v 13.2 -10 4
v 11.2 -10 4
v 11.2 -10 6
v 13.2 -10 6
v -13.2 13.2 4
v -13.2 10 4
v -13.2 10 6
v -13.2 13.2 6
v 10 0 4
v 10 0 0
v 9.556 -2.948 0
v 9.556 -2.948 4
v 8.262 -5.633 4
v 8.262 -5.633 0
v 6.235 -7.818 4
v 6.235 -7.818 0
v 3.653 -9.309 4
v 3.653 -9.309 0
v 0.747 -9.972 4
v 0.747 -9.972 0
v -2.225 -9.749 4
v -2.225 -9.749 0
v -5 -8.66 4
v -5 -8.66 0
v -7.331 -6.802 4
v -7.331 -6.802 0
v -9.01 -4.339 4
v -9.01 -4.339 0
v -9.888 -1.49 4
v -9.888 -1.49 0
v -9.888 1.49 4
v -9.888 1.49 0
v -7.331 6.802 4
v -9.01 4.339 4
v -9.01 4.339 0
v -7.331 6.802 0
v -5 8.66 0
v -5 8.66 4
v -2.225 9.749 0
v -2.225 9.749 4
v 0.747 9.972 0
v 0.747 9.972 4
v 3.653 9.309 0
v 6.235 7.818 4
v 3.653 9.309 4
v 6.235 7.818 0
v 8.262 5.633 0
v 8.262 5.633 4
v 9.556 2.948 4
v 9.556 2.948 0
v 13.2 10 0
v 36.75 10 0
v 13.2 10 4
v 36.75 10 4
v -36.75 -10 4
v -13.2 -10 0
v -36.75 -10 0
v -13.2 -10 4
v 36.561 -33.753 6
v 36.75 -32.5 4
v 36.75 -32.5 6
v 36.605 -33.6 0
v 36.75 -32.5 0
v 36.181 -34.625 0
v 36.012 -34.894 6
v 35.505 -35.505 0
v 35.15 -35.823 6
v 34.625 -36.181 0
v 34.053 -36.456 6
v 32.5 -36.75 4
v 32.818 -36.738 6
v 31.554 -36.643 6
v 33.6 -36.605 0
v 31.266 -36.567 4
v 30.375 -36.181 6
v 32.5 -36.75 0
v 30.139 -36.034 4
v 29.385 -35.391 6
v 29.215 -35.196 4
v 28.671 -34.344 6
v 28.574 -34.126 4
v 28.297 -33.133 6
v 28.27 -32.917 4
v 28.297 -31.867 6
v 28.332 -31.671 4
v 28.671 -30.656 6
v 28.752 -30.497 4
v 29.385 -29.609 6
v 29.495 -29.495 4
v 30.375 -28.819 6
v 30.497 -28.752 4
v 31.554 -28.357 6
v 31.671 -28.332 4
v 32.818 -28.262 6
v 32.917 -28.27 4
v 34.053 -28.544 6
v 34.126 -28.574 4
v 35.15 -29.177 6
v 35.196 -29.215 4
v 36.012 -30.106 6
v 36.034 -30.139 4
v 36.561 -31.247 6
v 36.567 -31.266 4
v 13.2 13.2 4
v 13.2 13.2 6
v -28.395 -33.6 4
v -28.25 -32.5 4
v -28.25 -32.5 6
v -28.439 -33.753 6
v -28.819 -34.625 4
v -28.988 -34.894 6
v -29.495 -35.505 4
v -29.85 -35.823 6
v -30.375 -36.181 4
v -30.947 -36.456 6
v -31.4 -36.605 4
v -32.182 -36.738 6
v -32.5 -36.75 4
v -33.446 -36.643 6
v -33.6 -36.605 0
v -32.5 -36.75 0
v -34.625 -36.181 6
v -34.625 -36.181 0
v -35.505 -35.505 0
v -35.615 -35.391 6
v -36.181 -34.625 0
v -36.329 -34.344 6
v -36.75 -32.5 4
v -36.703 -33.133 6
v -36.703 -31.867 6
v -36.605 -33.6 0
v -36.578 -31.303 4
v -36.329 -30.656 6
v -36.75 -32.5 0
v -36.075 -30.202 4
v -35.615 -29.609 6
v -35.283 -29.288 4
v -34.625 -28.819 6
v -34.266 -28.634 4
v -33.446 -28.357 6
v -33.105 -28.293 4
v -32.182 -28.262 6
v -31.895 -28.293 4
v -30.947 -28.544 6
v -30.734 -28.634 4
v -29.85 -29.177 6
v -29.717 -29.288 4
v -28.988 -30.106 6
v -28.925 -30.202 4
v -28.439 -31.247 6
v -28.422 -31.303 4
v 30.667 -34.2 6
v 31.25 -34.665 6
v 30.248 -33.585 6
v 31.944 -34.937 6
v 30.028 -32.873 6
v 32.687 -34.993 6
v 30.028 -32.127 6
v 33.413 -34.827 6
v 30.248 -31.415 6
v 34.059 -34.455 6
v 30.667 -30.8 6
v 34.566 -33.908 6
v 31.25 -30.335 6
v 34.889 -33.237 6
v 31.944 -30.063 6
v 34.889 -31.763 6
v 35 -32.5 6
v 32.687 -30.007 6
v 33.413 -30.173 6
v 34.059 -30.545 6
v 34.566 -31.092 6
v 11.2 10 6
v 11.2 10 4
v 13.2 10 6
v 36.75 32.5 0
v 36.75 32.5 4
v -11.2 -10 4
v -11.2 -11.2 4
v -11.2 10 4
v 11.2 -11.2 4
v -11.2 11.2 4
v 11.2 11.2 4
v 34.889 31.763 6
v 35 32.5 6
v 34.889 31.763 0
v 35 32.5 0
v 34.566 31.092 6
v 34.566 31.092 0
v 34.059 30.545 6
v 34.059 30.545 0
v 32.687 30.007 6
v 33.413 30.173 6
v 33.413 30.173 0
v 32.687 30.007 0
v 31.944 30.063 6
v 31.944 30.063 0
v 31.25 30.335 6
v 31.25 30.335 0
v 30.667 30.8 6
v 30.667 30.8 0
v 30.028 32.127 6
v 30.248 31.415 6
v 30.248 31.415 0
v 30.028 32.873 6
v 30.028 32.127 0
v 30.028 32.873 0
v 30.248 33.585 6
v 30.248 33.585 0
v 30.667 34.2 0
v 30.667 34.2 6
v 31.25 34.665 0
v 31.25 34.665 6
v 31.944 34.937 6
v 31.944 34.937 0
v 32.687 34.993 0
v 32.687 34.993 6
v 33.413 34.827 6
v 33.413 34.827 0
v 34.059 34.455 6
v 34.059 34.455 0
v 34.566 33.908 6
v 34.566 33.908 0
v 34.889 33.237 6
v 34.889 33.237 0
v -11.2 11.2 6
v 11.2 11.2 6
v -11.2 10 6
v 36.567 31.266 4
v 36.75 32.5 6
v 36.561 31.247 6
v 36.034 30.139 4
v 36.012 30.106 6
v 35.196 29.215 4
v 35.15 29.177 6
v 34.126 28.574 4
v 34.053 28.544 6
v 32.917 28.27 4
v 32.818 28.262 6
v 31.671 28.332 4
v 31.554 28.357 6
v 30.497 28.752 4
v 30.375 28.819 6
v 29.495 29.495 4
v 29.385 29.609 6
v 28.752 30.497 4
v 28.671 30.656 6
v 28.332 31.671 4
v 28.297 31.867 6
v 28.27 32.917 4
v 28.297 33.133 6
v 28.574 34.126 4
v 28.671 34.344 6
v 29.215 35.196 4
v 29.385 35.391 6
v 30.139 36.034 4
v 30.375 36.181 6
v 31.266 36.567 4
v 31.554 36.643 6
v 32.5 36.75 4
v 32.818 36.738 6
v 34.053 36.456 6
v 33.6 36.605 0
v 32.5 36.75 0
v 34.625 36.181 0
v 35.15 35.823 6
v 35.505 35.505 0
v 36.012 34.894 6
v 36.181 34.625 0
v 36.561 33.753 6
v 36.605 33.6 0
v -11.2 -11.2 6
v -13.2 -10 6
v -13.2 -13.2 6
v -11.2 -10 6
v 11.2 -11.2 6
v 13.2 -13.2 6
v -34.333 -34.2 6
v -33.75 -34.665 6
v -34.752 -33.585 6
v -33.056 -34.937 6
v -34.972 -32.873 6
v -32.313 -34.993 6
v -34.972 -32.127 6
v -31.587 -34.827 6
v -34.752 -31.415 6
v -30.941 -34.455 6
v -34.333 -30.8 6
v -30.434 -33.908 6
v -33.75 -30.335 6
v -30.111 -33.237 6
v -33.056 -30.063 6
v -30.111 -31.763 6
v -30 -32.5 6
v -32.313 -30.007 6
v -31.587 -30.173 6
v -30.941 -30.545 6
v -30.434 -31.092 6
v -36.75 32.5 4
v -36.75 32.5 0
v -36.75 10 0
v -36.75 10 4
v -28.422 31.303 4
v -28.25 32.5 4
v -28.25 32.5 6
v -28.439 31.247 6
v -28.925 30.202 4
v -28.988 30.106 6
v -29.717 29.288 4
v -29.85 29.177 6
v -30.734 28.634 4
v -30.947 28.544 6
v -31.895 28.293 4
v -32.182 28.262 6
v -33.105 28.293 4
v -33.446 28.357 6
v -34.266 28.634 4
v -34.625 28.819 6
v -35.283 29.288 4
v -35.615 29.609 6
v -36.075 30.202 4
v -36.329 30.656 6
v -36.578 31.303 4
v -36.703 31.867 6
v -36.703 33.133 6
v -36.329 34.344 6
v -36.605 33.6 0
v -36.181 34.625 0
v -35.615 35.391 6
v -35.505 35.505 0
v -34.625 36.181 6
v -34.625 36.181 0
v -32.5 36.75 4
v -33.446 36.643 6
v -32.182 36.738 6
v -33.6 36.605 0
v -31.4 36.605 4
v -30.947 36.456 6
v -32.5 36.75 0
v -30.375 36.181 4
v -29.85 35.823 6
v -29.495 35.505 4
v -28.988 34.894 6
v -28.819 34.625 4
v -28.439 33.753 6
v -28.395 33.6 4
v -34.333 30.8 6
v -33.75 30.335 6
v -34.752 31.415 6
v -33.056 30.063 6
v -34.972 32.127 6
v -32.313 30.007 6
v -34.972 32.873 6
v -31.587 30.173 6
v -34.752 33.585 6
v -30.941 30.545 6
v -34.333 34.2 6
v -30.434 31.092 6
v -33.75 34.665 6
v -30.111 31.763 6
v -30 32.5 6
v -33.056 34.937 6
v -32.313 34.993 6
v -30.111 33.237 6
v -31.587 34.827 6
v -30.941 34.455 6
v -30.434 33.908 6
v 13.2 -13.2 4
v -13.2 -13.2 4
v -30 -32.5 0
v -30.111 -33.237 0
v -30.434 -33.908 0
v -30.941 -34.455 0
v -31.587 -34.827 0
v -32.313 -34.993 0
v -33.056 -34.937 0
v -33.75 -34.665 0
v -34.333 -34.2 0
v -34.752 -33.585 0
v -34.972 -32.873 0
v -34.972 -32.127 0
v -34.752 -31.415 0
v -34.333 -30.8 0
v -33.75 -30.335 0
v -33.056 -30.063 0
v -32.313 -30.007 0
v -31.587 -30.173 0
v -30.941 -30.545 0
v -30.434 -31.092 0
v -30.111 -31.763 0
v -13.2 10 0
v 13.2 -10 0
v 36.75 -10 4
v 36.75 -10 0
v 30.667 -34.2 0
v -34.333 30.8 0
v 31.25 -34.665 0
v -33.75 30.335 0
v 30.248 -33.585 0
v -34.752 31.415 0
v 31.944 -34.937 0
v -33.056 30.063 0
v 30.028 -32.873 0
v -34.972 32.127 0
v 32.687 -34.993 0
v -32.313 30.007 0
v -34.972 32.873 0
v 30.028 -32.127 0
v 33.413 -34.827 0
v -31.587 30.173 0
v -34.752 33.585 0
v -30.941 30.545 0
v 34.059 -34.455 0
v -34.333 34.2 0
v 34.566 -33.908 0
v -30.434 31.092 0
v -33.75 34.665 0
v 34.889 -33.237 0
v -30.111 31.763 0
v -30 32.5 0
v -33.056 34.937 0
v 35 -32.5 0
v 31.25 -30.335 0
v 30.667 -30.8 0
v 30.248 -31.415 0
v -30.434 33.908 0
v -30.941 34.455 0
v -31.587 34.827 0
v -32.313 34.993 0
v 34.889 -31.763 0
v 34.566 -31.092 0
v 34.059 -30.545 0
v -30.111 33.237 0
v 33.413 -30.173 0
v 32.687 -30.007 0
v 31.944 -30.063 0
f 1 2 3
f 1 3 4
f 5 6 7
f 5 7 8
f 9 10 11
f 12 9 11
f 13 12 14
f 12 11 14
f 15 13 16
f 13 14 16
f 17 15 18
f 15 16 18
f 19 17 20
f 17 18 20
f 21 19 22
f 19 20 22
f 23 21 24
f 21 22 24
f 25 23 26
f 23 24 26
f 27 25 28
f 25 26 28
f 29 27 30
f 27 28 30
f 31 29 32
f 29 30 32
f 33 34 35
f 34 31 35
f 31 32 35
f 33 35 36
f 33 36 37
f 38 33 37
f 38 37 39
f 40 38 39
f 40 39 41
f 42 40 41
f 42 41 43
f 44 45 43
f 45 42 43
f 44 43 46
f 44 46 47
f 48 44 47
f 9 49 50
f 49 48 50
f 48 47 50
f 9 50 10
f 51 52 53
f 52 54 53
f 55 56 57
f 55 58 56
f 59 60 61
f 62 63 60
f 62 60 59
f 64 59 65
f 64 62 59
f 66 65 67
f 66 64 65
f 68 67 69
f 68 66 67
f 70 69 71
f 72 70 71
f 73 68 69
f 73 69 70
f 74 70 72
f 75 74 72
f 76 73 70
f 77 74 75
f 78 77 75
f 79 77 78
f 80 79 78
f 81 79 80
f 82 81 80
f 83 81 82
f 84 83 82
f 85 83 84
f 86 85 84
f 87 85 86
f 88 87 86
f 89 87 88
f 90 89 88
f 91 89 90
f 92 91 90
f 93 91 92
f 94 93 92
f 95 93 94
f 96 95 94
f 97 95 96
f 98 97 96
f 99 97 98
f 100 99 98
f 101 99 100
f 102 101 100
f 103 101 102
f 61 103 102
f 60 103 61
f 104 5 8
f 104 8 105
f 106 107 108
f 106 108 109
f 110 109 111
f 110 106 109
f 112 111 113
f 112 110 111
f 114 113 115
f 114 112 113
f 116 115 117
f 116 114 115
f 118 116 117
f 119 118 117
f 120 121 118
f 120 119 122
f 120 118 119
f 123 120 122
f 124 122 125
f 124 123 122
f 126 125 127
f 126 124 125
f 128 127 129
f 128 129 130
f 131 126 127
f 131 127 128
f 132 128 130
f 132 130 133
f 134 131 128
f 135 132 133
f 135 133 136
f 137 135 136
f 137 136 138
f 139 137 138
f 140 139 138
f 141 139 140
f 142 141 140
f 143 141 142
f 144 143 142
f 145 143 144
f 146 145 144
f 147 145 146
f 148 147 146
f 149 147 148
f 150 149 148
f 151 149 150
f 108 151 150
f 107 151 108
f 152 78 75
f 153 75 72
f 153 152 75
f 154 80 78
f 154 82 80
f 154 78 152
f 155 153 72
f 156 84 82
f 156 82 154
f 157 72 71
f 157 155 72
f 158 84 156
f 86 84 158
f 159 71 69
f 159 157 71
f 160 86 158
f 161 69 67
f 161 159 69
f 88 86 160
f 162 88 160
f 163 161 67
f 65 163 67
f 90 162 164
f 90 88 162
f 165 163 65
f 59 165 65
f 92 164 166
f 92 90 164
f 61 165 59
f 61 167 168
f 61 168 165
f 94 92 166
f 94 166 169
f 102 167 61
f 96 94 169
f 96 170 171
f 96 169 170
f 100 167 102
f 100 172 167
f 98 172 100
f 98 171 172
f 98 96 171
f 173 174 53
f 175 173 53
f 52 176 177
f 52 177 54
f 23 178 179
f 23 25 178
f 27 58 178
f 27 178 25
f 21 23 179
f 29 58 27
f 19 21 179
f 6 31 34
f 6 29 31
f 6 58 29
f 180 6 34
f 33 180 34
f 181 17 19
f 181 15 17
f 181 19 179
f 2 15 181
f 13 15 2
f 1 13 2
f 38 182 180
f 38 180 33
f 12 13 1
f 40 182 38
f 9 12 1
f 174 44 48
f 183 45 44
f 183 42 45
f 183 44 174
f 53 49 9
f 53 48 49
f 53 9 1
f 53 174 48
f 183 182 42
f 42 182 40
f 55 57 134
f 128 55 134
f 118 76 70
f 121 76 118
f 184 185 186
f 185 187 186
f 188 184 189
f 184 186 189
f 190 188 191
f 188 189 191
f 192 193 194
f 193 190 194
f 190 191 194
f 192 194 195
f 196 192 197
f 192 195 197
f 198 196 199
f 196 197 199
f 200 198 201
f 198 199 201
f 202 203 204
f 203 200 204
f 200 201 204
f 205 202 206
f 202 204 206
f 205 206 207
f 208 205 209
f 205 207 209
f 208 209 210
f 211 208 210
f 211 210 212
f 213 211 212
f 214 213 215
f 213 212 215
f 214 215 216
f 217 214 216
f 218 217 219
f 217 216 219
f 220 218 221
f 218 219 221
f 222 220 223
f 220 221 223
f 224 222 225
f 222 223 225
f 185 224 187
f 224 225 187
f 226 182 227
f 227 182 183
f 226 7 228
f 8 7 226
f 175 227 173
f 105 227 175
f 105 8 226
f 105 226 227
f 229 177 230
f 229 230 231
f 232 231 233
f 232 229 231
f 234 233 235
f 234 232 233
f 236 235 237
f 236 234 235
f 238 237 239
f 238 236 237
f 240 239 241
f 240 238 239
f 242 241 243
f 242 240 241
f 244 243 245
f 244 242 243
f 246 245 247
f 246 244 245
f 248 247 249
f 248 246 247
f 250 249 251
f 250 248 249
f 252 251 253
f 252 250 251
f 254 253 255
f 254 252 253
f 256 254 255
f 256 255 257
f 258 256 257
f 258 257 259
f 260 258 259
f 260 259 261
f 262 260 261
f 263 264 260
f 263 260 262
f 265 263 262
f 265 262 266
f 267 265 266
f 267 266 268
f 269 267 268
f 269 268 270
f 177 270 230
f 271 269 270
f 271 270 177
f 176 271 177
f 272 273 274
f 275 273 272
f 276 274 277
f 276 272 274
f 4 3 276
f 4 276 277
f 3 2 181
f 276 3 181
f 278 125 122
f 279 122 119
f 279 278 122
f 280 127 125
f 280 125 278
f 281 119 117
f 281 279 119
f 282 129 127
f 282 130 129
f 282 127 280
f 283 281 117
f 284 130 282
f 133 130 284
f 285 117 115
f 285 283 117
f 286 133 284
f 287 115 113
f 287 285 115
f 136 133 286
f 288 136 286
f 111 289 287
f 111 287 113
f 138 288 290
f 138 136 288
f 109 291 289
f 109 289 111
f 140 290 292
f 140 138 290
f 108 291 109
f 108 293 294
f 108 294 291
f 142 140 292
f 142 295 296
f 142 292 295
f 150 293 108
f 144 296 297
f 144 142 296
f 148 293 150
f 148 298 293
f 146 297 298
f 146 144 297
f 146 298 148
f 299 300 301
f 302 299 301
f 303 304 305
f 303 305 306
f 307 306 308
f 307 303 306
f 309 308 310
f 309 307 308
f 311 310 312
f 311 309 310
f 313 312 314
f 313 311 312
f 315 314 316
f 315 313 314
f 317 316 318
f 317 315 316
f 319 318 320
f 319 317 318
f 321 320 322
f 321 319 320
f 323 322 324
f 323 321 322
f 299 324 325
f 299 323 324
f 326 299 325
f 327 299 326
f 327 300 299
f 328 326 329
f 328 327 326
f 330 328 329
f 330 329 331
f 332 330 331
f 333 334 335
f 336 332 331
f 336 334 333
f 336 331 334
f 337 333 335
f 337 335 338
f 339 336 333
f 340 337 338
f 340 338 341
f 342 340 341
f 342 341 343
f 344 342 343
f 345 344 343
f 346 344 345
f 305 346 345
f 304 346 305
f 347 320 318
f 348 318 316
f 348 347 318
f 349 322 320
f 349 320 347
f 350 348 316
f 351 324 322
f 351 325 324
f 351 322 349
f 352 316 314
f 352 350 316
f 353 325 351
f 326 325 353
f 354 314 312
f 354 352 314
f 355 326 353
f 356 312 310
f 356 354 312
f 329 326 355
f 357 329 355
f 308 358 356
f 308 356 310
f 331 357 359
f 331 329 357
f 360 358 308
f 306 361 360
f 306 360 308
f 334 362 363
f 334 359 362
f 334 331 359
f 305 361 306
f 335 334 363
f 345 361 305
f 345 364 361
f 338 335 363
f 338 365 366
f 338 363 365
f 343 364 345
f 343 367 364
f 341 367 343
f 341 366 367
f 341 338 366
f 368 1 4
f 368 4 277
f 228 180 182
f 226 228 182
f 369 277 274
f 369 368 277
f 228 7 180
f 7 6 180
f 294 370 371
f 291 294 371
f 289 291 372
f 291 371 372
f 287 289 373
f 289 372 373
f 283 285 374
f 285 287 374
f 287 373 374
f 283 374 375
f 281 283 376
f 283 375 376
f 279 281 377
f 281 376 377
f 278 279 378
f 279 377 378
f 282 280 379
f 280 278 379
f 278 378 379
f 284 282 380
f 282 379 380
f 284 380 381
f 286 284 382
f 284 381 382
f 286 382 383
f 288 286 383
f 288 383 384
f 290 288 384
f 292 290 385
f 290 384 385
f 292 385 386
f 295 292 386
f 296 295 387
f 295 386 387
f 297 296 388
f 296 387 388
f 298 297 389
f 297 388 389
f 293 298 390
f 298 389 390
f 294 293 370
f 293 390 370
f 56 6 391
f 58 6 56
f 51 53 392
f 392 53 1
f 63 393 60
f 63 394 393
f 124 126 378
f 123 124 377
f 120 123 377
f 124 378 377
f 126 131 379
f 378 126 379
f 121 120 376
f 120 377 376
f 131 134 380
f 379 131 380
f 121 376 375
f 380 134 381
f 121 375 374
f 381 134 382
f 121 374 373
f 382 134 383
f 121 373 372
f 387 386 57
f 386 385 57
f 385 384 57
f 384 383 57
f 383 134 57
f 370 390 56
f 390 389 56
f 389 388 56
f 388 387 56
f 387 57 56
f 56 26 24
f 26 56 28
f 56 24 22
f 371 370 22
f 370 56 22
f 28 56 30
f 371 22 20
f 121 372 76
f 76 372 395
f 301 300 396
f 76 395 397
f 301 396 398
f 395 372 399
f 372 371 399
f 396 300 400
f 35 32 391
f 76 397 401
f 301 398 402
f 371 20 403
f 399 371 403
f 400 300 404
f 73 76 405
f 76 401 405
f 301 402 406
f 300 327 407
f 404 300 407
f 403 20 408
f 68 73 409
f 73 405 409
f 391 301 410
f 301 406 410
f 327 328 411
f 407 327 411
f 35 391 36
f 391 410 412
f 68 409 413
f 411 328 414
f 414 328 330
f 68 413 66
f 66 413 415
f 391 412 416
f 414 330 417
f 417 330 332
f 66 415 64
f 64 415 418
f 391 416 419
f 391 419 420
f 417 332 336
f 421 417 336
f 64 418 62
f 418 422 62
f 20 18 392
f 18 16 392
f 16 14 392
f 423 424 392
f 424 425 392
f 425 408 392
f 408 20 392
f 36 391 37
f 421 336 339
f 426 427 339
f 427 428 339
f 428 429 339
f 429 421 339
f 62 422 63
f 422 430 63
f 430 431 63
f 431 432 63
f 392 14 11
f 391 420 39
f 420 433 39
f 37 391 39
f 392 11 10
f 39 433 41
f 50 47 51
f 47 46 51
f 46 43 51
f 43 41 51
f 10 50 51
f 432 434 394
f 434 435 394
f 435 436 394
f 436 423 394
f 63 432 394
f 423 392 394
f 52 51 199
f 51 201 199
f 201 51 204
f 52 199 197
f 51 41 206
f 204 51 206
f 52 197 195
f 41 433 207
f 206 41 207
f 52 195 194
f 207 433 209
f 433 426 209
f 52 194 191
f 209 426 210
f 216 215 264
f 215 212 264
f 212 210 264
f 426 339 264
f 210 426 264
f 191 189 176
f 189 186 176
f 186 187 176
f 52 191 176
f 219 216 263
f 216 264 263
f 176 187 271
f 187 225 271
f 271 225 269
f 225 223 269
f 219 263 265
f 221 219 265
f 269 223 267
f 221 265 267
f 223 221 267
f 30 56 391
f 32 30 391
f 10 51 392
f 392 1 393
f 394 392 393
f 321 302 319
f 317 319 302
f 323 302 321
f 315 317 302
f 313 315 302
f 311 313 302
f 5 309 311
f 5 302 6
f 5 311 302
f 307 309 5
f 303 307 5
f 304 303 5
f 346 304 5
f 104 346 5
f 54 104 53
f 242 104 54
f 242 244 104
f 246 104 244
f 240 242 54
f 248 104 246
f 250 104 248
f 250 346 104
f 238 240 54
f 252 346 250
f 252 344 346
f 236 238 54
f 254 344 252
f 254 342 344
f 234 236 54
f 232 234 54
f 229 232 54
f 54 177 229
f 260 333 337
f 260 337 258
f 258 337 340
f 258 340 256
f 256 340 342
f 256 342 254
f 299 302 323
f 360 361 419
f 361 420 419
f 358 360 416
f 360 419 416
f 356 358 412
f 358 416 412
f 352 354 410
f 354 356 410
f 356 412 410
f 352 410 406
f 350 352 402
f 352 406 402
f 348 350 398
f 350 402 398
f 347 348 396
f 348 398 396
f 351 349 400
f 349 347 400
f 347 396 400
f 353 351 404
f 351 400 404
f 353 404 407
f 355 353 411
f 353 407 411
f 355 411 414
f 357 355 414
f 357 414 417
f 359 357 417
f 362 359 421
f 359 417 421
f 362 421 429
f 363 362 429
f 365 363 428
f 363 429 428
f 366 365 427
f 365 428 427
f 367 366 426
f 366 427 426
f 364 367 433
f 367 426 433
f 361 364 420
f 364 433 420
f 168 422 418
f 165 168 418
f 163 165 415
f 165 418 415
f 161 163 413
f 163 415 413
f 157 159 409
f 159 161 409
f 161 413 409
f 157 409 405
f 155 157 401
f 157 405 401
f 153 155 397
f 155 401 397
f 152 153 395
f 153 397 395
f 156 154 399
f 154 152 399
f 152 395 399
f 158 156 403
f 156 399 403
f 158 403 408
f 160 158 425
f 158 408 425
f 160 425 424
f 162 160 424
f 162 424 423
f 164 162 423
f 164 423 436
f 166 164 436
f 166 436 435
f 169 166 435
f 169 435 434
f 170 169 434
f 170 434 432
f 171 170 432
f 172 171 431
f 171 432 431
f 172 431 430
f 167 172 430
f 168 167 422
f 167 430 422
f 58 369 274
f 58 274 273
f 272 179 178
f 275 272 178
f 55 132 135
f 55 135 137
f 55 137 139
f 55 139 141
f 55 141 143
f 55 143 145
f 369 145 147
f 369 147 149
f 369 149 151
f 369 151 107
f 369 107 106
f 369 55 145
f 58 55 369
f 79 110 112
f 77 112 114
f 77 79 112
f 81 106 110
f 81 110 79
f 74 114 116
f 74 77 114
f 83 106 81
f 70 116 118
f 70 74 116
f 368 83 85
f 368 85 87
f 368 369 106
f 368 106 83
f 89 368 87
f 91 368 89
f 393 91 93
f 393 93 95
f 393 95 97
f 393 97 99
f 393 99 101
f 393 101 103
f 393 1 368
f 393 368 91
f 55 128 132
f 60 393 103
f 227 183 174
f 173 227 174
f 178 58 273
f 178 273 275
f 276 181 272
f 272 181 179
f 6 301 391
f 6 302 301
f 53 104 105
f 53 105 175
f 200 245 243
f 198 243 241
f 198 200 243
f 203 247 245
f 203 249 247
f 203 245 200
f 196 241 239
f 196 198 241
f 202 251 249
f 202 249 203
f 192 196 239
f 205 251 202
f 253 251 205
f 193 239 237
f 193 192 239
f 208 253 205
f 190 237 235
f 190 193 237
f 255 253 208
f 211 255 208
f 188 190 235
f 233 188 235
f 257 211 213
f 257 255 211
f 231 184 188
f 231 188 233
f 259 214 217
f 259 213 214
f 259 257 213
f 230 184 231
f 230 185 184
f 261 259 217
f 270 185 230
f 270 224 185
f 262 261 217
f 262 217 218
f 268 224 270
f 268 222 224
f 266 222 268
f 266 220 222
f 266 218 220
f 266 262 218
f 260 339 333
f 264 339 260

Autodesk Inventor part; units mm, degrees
ref_plane "YZ Plane" through (0, 0, 0) normal (1, 0, 0) x (0, 1, 0)
ref_plane "XZ Plane" through (0, 0, 0) normal (0, 1, 0) x (-1, 0, 0)
ref_plane "XY Plane" through (0, 0, 0) normal (0, 0, 1) x (1, 0, 0)
sketch "Sketch1" plane through (0, 0, 0) normal (0, 0, 1) x (1, 0, 0)
  line L0 (-32.5, 32.5) -> (32.5, 32.5) construction
  line L1 (32.5, 32.5) -> (32.5, -32.5) construction
  line L2 (32.5, -32.5) -> (-32.5, -32.5) construction
  line L3 (-32.5, -32.5) -> (-32.5, 32.5) construction
  circle A0 centre (-32.5, 32.5) radius 2.5
  circle A1 centre (32.5, 32.5) radius 2.5
  circle A2 centre (-32.5, -32.5) radius 2.5
  circle A3 centre (32.5, -32.5) radius 2.5
  line L4 (-32.5, 32.5) -> (32.5, -32.5) construction
  circle A4 centre (0, 0) radius 10
  circle A5 centre (-32.5, 32.5) radius 4.25
  circle A6 centre (32.5, 32.5) radius 4.25
  circle A7 centre (-32.5, -32.5) radius 4.25
  circle A8 centre (32.5, -32.5) radius 4.25
  line L5 (-32.5, 36.75) -> (32.5, 36.75)
  line L6 (32.5, -36.75) -> (-32.5, -36.75)
  line L7 (-36.75, 32.5) -> (-36.75, -32.5)
  line L8 (36.75, 32.5) -> (36.75, -32.5)
  dimension "d1" = 65
  dimension "d2" = 5
  dimension "d4" = 20
  dimension "d16" = 8.5
extrude "Extrusion1" add sketch "Sketch1" along normal blind 4
sketch "Sketch2" plane through (0, 0, 4) normal (0, 0, 1) x (1, 0, 0)
  line L0 (-11.2, 11.2) -> (11.2, 11.2)
  line L1 (11.2, -11.2) -> (-11.2, -11.2)
  line L2 (0, 11.2) -> (0, 36.75) construction
  line L3 (0, -11.2) -> (0, -36.75) construction
  line L4 (-13.2, 13.2) -> (13.2, 13.2)
  line L5 (13.2, -13.2) -> (-13.2, -13.2)
  line L6 (11.2, 11.2) -> (13.2, 13.2) construction
  line L7 (-11.2, 11.2) -> (-13.2, 13.2) construction
  line L8 (-13.2, -13.2) -> (-11.2, -11.2) construction
  line L9 (11.2, -11.2) -> (13.2, -13.2) construction
  circle A0 centre (0, 0) radius 10 projected
  circle A1 centre (-32.5, -32.5) radius 2.5 projected
  circle A2 centre (32.5, -32.5) radius 2.5 projected
  circle A3 centre (32.5, 32.5) radius 2.5 projected
  circle A4 centre (-32.5, 32.5) radius 2.5 projected
  arc A5 (32.5, -36.75) -> (36.75, -32.5) centre (32.5, -32.5) ccw projected
  line L10 (36.75, -32.5) -> (36.75, 32.5) projected
  arc A6 (36.75, 32.5) -> (32.5, 36.75) centre (32.5, 32.5) ccw projected
  line L11 (32.5, 36.75) -> (-32.5, 36.75) projected
  arc A7 (-32.5, 36.75) -> (-36.75, 32.5) centre (-32.5, 32.5) ccw projected
  line L12 (-36.75, 32.5) -> (-36.75, -32.5) projected
  arc A8 (-36.75, -32.5) -> (-32.5, -36.75) centre (-32.5, -32.5) ccw projected
  line L13 (-32.5, -36.75) -> (32.5, -36.75) projected
  line L14 (-32.5, -36.75) -> (32.5, -36.75) projected
  line L15 (36.75, -32.5) -> (36.75, 32.5) projected
  line L16 (32.5, 36.75) -> (-32.5, 36.75) projected
  line L17 (-13.2, 10) -> (-11.2, 10)
  line L18 (-13.2, -10) -> (-11.2, -10)
  line L19 (-13.2, -13.2) -> (-13.2, -10)
  line L20 (-13.2, 10) -> (-13.2, 13.2)
  line L21 (-11.2, -11.2) -> (-11.2, -10)
  line L22 (-11.2, 10) -> (-11.2, 11.2)
  line L23 (11.2, 10) -> (13.2, 10)
  line L24 (11.2, -10) -> (13.2, -10)
  line L25 (11.2, 11.2) -> (11.2, 10)
  line L26 (11.2, -10) -> (11.2, -11.2)
  line L27 (13.2, 13.2) -> (13.2, 10)
  line L28 (13.2, -10) -> (13.2, -13.2)
  line L29 (-11.2, 11.2) -> (0, 0) construction
  line L30 (0, 0) -> (-11.2, -11.2) construction
  line L31 (0, 0) -> (11.2, 11.2) construction
  line L32 (0, 0) -> (11.2, -11.2) construction
  dimension "d7" = 22.4
  dimension "d24" = 2
  dimension "d31" = 2
  dimension "d34" = 20
extrude "Extrusion2" add sketch "Sketch2" along normal blind 2 contours L22 L17 L20 L4 L27 L23 L25 L0 | L26 L24 L28 L5 L19 L18 L21 L1
extrude "Extrusion4" add sketch "Sketch1" along normal blind 6 contours A5 | A6 | A7 | A8
sketch "Sketch4" plane through (0, 0, 4) normal (0, 0, 1) x (1, 0, 0)
  line L0 (13.2, 13.2) -> (13.2, 10) projected
  line L1 (-13.2, 13.2) -> (13.2, 13.2) projected
  arc A0 (36.75, -32.5) -> (32.5, -36.75) centre (32.5, -32.5) ccw projected
  line L2 (36.75, -32.5) -> (36.75, 32.5) projected
  arc A1 (32.5, 36.75) -> (36.75, 32.5) centre (32.5, 32.5) ccw projected
  line L3 (32.5, 36.75) -> (-32.5, 36.75) projected
  arc A2 (-36.75, 32.5) -> (-32.5, 36.75) centre (-32.5, 32.5) ccw projected
  line L4 (-36.75, 32.5) -> (-36.75, -32.5) projected
  arc A3 (-32.5, -36.75) -> (-36.75, -32.5) centre (-32.5, -32.5) ccw projected
  line L5 (-32.5, -36.75) -> (32.5, -36.75) projected
  line L6 (-13.2, 10) -> (-13.2, -10)
  line L7 (-13.2, -10) -> (-36.75, -10)
  line L8 (-36.75, -10) -> (-36.75, 10)
  line L9 (-36.75, 10) -> (-13.2, 10)
  line L10 (32.5, 36.75) -> (-32.5, 36.75) construction
  line L11 (0, 36.75) -> (0, -36.75) construction
  line L12 (13.2, 10) -> (13.2, -10)
  line L13 (13.2, -10) -> (36.75, -10)
  line L14 (36.75, -10) -> (36.75, 10)
  line L15 (36.75, 10) -> (13.2, 10)
  line L16 (-11.2, 11.2) -> (-11.2, 10) projected
  line L17 (-11.2, 10) -> (-13.2, 10) projected
  line L18 (-13.2, 10) -> (-13.2, 13.2) projected
  line L19 (13.2, 10) -> (11.2, 10) projected
  line L20 (11.2, 10) -> (11.2, 11.2) projected
  line L21 (11.2, 11.2) -> (-11.2, 11.2) projected
  line L22 (-11.2, 11.2) -> (11.2, 11.2) projected
  line L23 (11.2, 11.2) -> (11.2, 10) projected
  line L24 (11.2, 10) -> (13.2, 10) projected
  line L25 (13.2, 10) -> (13.2, 13.2) projected
  line L26 (13.2, 13.2) -> (-13.2, 13.2) projected
  line L27 (-13.2, 13.2) -> (-13.2, 10) projected
  line L28 (-13.2, 10) -> (-11.2, 10) projected
  line L29 (-11.2, 10) -> (-11.2, 11.2) projected
  line L30 (-11.2, -11.2) -> (-11.2, -10) projected
  line L31 (-13.2, -10) -> (-13.2, -13.2) projected
  line L32 (-13.2, 13.2) -> (-13.2, 10) projected
  circle A4 centre (0, 0) radius 10 projected
  line L33 (-11.2, -11.2) -> (11.2, -11.2) projected
  line L34 (11.2, -11.2) -> (11.2, -10) projected
  line L35 (11.2, -10) -> (13.2, -10) projected
  line L36 (13.2, -10) -> (13.2, -13.2) projected
  line L37 (13.2, -13.2) -> (-13.2, -13.2) projected
  line L38 (-13.2, -13.2) -> (-13.2, -10) projected
  line L39 (-13.2, -10) -> (-11.2, -10) projected
  line L40 (-11.2, -10) -> (-11.2, -11.2) projected
  point P0 (-36.75, 0)
  point P1 (36.75, 0)
  dimension "d20" = 20
extrude "Extrusion5" cut sketch "Sketch4" against normal through all contours L15 L2 L13 L12 | L6 L7 L4 L9
properties part number "20mm glass cuvette holder"
